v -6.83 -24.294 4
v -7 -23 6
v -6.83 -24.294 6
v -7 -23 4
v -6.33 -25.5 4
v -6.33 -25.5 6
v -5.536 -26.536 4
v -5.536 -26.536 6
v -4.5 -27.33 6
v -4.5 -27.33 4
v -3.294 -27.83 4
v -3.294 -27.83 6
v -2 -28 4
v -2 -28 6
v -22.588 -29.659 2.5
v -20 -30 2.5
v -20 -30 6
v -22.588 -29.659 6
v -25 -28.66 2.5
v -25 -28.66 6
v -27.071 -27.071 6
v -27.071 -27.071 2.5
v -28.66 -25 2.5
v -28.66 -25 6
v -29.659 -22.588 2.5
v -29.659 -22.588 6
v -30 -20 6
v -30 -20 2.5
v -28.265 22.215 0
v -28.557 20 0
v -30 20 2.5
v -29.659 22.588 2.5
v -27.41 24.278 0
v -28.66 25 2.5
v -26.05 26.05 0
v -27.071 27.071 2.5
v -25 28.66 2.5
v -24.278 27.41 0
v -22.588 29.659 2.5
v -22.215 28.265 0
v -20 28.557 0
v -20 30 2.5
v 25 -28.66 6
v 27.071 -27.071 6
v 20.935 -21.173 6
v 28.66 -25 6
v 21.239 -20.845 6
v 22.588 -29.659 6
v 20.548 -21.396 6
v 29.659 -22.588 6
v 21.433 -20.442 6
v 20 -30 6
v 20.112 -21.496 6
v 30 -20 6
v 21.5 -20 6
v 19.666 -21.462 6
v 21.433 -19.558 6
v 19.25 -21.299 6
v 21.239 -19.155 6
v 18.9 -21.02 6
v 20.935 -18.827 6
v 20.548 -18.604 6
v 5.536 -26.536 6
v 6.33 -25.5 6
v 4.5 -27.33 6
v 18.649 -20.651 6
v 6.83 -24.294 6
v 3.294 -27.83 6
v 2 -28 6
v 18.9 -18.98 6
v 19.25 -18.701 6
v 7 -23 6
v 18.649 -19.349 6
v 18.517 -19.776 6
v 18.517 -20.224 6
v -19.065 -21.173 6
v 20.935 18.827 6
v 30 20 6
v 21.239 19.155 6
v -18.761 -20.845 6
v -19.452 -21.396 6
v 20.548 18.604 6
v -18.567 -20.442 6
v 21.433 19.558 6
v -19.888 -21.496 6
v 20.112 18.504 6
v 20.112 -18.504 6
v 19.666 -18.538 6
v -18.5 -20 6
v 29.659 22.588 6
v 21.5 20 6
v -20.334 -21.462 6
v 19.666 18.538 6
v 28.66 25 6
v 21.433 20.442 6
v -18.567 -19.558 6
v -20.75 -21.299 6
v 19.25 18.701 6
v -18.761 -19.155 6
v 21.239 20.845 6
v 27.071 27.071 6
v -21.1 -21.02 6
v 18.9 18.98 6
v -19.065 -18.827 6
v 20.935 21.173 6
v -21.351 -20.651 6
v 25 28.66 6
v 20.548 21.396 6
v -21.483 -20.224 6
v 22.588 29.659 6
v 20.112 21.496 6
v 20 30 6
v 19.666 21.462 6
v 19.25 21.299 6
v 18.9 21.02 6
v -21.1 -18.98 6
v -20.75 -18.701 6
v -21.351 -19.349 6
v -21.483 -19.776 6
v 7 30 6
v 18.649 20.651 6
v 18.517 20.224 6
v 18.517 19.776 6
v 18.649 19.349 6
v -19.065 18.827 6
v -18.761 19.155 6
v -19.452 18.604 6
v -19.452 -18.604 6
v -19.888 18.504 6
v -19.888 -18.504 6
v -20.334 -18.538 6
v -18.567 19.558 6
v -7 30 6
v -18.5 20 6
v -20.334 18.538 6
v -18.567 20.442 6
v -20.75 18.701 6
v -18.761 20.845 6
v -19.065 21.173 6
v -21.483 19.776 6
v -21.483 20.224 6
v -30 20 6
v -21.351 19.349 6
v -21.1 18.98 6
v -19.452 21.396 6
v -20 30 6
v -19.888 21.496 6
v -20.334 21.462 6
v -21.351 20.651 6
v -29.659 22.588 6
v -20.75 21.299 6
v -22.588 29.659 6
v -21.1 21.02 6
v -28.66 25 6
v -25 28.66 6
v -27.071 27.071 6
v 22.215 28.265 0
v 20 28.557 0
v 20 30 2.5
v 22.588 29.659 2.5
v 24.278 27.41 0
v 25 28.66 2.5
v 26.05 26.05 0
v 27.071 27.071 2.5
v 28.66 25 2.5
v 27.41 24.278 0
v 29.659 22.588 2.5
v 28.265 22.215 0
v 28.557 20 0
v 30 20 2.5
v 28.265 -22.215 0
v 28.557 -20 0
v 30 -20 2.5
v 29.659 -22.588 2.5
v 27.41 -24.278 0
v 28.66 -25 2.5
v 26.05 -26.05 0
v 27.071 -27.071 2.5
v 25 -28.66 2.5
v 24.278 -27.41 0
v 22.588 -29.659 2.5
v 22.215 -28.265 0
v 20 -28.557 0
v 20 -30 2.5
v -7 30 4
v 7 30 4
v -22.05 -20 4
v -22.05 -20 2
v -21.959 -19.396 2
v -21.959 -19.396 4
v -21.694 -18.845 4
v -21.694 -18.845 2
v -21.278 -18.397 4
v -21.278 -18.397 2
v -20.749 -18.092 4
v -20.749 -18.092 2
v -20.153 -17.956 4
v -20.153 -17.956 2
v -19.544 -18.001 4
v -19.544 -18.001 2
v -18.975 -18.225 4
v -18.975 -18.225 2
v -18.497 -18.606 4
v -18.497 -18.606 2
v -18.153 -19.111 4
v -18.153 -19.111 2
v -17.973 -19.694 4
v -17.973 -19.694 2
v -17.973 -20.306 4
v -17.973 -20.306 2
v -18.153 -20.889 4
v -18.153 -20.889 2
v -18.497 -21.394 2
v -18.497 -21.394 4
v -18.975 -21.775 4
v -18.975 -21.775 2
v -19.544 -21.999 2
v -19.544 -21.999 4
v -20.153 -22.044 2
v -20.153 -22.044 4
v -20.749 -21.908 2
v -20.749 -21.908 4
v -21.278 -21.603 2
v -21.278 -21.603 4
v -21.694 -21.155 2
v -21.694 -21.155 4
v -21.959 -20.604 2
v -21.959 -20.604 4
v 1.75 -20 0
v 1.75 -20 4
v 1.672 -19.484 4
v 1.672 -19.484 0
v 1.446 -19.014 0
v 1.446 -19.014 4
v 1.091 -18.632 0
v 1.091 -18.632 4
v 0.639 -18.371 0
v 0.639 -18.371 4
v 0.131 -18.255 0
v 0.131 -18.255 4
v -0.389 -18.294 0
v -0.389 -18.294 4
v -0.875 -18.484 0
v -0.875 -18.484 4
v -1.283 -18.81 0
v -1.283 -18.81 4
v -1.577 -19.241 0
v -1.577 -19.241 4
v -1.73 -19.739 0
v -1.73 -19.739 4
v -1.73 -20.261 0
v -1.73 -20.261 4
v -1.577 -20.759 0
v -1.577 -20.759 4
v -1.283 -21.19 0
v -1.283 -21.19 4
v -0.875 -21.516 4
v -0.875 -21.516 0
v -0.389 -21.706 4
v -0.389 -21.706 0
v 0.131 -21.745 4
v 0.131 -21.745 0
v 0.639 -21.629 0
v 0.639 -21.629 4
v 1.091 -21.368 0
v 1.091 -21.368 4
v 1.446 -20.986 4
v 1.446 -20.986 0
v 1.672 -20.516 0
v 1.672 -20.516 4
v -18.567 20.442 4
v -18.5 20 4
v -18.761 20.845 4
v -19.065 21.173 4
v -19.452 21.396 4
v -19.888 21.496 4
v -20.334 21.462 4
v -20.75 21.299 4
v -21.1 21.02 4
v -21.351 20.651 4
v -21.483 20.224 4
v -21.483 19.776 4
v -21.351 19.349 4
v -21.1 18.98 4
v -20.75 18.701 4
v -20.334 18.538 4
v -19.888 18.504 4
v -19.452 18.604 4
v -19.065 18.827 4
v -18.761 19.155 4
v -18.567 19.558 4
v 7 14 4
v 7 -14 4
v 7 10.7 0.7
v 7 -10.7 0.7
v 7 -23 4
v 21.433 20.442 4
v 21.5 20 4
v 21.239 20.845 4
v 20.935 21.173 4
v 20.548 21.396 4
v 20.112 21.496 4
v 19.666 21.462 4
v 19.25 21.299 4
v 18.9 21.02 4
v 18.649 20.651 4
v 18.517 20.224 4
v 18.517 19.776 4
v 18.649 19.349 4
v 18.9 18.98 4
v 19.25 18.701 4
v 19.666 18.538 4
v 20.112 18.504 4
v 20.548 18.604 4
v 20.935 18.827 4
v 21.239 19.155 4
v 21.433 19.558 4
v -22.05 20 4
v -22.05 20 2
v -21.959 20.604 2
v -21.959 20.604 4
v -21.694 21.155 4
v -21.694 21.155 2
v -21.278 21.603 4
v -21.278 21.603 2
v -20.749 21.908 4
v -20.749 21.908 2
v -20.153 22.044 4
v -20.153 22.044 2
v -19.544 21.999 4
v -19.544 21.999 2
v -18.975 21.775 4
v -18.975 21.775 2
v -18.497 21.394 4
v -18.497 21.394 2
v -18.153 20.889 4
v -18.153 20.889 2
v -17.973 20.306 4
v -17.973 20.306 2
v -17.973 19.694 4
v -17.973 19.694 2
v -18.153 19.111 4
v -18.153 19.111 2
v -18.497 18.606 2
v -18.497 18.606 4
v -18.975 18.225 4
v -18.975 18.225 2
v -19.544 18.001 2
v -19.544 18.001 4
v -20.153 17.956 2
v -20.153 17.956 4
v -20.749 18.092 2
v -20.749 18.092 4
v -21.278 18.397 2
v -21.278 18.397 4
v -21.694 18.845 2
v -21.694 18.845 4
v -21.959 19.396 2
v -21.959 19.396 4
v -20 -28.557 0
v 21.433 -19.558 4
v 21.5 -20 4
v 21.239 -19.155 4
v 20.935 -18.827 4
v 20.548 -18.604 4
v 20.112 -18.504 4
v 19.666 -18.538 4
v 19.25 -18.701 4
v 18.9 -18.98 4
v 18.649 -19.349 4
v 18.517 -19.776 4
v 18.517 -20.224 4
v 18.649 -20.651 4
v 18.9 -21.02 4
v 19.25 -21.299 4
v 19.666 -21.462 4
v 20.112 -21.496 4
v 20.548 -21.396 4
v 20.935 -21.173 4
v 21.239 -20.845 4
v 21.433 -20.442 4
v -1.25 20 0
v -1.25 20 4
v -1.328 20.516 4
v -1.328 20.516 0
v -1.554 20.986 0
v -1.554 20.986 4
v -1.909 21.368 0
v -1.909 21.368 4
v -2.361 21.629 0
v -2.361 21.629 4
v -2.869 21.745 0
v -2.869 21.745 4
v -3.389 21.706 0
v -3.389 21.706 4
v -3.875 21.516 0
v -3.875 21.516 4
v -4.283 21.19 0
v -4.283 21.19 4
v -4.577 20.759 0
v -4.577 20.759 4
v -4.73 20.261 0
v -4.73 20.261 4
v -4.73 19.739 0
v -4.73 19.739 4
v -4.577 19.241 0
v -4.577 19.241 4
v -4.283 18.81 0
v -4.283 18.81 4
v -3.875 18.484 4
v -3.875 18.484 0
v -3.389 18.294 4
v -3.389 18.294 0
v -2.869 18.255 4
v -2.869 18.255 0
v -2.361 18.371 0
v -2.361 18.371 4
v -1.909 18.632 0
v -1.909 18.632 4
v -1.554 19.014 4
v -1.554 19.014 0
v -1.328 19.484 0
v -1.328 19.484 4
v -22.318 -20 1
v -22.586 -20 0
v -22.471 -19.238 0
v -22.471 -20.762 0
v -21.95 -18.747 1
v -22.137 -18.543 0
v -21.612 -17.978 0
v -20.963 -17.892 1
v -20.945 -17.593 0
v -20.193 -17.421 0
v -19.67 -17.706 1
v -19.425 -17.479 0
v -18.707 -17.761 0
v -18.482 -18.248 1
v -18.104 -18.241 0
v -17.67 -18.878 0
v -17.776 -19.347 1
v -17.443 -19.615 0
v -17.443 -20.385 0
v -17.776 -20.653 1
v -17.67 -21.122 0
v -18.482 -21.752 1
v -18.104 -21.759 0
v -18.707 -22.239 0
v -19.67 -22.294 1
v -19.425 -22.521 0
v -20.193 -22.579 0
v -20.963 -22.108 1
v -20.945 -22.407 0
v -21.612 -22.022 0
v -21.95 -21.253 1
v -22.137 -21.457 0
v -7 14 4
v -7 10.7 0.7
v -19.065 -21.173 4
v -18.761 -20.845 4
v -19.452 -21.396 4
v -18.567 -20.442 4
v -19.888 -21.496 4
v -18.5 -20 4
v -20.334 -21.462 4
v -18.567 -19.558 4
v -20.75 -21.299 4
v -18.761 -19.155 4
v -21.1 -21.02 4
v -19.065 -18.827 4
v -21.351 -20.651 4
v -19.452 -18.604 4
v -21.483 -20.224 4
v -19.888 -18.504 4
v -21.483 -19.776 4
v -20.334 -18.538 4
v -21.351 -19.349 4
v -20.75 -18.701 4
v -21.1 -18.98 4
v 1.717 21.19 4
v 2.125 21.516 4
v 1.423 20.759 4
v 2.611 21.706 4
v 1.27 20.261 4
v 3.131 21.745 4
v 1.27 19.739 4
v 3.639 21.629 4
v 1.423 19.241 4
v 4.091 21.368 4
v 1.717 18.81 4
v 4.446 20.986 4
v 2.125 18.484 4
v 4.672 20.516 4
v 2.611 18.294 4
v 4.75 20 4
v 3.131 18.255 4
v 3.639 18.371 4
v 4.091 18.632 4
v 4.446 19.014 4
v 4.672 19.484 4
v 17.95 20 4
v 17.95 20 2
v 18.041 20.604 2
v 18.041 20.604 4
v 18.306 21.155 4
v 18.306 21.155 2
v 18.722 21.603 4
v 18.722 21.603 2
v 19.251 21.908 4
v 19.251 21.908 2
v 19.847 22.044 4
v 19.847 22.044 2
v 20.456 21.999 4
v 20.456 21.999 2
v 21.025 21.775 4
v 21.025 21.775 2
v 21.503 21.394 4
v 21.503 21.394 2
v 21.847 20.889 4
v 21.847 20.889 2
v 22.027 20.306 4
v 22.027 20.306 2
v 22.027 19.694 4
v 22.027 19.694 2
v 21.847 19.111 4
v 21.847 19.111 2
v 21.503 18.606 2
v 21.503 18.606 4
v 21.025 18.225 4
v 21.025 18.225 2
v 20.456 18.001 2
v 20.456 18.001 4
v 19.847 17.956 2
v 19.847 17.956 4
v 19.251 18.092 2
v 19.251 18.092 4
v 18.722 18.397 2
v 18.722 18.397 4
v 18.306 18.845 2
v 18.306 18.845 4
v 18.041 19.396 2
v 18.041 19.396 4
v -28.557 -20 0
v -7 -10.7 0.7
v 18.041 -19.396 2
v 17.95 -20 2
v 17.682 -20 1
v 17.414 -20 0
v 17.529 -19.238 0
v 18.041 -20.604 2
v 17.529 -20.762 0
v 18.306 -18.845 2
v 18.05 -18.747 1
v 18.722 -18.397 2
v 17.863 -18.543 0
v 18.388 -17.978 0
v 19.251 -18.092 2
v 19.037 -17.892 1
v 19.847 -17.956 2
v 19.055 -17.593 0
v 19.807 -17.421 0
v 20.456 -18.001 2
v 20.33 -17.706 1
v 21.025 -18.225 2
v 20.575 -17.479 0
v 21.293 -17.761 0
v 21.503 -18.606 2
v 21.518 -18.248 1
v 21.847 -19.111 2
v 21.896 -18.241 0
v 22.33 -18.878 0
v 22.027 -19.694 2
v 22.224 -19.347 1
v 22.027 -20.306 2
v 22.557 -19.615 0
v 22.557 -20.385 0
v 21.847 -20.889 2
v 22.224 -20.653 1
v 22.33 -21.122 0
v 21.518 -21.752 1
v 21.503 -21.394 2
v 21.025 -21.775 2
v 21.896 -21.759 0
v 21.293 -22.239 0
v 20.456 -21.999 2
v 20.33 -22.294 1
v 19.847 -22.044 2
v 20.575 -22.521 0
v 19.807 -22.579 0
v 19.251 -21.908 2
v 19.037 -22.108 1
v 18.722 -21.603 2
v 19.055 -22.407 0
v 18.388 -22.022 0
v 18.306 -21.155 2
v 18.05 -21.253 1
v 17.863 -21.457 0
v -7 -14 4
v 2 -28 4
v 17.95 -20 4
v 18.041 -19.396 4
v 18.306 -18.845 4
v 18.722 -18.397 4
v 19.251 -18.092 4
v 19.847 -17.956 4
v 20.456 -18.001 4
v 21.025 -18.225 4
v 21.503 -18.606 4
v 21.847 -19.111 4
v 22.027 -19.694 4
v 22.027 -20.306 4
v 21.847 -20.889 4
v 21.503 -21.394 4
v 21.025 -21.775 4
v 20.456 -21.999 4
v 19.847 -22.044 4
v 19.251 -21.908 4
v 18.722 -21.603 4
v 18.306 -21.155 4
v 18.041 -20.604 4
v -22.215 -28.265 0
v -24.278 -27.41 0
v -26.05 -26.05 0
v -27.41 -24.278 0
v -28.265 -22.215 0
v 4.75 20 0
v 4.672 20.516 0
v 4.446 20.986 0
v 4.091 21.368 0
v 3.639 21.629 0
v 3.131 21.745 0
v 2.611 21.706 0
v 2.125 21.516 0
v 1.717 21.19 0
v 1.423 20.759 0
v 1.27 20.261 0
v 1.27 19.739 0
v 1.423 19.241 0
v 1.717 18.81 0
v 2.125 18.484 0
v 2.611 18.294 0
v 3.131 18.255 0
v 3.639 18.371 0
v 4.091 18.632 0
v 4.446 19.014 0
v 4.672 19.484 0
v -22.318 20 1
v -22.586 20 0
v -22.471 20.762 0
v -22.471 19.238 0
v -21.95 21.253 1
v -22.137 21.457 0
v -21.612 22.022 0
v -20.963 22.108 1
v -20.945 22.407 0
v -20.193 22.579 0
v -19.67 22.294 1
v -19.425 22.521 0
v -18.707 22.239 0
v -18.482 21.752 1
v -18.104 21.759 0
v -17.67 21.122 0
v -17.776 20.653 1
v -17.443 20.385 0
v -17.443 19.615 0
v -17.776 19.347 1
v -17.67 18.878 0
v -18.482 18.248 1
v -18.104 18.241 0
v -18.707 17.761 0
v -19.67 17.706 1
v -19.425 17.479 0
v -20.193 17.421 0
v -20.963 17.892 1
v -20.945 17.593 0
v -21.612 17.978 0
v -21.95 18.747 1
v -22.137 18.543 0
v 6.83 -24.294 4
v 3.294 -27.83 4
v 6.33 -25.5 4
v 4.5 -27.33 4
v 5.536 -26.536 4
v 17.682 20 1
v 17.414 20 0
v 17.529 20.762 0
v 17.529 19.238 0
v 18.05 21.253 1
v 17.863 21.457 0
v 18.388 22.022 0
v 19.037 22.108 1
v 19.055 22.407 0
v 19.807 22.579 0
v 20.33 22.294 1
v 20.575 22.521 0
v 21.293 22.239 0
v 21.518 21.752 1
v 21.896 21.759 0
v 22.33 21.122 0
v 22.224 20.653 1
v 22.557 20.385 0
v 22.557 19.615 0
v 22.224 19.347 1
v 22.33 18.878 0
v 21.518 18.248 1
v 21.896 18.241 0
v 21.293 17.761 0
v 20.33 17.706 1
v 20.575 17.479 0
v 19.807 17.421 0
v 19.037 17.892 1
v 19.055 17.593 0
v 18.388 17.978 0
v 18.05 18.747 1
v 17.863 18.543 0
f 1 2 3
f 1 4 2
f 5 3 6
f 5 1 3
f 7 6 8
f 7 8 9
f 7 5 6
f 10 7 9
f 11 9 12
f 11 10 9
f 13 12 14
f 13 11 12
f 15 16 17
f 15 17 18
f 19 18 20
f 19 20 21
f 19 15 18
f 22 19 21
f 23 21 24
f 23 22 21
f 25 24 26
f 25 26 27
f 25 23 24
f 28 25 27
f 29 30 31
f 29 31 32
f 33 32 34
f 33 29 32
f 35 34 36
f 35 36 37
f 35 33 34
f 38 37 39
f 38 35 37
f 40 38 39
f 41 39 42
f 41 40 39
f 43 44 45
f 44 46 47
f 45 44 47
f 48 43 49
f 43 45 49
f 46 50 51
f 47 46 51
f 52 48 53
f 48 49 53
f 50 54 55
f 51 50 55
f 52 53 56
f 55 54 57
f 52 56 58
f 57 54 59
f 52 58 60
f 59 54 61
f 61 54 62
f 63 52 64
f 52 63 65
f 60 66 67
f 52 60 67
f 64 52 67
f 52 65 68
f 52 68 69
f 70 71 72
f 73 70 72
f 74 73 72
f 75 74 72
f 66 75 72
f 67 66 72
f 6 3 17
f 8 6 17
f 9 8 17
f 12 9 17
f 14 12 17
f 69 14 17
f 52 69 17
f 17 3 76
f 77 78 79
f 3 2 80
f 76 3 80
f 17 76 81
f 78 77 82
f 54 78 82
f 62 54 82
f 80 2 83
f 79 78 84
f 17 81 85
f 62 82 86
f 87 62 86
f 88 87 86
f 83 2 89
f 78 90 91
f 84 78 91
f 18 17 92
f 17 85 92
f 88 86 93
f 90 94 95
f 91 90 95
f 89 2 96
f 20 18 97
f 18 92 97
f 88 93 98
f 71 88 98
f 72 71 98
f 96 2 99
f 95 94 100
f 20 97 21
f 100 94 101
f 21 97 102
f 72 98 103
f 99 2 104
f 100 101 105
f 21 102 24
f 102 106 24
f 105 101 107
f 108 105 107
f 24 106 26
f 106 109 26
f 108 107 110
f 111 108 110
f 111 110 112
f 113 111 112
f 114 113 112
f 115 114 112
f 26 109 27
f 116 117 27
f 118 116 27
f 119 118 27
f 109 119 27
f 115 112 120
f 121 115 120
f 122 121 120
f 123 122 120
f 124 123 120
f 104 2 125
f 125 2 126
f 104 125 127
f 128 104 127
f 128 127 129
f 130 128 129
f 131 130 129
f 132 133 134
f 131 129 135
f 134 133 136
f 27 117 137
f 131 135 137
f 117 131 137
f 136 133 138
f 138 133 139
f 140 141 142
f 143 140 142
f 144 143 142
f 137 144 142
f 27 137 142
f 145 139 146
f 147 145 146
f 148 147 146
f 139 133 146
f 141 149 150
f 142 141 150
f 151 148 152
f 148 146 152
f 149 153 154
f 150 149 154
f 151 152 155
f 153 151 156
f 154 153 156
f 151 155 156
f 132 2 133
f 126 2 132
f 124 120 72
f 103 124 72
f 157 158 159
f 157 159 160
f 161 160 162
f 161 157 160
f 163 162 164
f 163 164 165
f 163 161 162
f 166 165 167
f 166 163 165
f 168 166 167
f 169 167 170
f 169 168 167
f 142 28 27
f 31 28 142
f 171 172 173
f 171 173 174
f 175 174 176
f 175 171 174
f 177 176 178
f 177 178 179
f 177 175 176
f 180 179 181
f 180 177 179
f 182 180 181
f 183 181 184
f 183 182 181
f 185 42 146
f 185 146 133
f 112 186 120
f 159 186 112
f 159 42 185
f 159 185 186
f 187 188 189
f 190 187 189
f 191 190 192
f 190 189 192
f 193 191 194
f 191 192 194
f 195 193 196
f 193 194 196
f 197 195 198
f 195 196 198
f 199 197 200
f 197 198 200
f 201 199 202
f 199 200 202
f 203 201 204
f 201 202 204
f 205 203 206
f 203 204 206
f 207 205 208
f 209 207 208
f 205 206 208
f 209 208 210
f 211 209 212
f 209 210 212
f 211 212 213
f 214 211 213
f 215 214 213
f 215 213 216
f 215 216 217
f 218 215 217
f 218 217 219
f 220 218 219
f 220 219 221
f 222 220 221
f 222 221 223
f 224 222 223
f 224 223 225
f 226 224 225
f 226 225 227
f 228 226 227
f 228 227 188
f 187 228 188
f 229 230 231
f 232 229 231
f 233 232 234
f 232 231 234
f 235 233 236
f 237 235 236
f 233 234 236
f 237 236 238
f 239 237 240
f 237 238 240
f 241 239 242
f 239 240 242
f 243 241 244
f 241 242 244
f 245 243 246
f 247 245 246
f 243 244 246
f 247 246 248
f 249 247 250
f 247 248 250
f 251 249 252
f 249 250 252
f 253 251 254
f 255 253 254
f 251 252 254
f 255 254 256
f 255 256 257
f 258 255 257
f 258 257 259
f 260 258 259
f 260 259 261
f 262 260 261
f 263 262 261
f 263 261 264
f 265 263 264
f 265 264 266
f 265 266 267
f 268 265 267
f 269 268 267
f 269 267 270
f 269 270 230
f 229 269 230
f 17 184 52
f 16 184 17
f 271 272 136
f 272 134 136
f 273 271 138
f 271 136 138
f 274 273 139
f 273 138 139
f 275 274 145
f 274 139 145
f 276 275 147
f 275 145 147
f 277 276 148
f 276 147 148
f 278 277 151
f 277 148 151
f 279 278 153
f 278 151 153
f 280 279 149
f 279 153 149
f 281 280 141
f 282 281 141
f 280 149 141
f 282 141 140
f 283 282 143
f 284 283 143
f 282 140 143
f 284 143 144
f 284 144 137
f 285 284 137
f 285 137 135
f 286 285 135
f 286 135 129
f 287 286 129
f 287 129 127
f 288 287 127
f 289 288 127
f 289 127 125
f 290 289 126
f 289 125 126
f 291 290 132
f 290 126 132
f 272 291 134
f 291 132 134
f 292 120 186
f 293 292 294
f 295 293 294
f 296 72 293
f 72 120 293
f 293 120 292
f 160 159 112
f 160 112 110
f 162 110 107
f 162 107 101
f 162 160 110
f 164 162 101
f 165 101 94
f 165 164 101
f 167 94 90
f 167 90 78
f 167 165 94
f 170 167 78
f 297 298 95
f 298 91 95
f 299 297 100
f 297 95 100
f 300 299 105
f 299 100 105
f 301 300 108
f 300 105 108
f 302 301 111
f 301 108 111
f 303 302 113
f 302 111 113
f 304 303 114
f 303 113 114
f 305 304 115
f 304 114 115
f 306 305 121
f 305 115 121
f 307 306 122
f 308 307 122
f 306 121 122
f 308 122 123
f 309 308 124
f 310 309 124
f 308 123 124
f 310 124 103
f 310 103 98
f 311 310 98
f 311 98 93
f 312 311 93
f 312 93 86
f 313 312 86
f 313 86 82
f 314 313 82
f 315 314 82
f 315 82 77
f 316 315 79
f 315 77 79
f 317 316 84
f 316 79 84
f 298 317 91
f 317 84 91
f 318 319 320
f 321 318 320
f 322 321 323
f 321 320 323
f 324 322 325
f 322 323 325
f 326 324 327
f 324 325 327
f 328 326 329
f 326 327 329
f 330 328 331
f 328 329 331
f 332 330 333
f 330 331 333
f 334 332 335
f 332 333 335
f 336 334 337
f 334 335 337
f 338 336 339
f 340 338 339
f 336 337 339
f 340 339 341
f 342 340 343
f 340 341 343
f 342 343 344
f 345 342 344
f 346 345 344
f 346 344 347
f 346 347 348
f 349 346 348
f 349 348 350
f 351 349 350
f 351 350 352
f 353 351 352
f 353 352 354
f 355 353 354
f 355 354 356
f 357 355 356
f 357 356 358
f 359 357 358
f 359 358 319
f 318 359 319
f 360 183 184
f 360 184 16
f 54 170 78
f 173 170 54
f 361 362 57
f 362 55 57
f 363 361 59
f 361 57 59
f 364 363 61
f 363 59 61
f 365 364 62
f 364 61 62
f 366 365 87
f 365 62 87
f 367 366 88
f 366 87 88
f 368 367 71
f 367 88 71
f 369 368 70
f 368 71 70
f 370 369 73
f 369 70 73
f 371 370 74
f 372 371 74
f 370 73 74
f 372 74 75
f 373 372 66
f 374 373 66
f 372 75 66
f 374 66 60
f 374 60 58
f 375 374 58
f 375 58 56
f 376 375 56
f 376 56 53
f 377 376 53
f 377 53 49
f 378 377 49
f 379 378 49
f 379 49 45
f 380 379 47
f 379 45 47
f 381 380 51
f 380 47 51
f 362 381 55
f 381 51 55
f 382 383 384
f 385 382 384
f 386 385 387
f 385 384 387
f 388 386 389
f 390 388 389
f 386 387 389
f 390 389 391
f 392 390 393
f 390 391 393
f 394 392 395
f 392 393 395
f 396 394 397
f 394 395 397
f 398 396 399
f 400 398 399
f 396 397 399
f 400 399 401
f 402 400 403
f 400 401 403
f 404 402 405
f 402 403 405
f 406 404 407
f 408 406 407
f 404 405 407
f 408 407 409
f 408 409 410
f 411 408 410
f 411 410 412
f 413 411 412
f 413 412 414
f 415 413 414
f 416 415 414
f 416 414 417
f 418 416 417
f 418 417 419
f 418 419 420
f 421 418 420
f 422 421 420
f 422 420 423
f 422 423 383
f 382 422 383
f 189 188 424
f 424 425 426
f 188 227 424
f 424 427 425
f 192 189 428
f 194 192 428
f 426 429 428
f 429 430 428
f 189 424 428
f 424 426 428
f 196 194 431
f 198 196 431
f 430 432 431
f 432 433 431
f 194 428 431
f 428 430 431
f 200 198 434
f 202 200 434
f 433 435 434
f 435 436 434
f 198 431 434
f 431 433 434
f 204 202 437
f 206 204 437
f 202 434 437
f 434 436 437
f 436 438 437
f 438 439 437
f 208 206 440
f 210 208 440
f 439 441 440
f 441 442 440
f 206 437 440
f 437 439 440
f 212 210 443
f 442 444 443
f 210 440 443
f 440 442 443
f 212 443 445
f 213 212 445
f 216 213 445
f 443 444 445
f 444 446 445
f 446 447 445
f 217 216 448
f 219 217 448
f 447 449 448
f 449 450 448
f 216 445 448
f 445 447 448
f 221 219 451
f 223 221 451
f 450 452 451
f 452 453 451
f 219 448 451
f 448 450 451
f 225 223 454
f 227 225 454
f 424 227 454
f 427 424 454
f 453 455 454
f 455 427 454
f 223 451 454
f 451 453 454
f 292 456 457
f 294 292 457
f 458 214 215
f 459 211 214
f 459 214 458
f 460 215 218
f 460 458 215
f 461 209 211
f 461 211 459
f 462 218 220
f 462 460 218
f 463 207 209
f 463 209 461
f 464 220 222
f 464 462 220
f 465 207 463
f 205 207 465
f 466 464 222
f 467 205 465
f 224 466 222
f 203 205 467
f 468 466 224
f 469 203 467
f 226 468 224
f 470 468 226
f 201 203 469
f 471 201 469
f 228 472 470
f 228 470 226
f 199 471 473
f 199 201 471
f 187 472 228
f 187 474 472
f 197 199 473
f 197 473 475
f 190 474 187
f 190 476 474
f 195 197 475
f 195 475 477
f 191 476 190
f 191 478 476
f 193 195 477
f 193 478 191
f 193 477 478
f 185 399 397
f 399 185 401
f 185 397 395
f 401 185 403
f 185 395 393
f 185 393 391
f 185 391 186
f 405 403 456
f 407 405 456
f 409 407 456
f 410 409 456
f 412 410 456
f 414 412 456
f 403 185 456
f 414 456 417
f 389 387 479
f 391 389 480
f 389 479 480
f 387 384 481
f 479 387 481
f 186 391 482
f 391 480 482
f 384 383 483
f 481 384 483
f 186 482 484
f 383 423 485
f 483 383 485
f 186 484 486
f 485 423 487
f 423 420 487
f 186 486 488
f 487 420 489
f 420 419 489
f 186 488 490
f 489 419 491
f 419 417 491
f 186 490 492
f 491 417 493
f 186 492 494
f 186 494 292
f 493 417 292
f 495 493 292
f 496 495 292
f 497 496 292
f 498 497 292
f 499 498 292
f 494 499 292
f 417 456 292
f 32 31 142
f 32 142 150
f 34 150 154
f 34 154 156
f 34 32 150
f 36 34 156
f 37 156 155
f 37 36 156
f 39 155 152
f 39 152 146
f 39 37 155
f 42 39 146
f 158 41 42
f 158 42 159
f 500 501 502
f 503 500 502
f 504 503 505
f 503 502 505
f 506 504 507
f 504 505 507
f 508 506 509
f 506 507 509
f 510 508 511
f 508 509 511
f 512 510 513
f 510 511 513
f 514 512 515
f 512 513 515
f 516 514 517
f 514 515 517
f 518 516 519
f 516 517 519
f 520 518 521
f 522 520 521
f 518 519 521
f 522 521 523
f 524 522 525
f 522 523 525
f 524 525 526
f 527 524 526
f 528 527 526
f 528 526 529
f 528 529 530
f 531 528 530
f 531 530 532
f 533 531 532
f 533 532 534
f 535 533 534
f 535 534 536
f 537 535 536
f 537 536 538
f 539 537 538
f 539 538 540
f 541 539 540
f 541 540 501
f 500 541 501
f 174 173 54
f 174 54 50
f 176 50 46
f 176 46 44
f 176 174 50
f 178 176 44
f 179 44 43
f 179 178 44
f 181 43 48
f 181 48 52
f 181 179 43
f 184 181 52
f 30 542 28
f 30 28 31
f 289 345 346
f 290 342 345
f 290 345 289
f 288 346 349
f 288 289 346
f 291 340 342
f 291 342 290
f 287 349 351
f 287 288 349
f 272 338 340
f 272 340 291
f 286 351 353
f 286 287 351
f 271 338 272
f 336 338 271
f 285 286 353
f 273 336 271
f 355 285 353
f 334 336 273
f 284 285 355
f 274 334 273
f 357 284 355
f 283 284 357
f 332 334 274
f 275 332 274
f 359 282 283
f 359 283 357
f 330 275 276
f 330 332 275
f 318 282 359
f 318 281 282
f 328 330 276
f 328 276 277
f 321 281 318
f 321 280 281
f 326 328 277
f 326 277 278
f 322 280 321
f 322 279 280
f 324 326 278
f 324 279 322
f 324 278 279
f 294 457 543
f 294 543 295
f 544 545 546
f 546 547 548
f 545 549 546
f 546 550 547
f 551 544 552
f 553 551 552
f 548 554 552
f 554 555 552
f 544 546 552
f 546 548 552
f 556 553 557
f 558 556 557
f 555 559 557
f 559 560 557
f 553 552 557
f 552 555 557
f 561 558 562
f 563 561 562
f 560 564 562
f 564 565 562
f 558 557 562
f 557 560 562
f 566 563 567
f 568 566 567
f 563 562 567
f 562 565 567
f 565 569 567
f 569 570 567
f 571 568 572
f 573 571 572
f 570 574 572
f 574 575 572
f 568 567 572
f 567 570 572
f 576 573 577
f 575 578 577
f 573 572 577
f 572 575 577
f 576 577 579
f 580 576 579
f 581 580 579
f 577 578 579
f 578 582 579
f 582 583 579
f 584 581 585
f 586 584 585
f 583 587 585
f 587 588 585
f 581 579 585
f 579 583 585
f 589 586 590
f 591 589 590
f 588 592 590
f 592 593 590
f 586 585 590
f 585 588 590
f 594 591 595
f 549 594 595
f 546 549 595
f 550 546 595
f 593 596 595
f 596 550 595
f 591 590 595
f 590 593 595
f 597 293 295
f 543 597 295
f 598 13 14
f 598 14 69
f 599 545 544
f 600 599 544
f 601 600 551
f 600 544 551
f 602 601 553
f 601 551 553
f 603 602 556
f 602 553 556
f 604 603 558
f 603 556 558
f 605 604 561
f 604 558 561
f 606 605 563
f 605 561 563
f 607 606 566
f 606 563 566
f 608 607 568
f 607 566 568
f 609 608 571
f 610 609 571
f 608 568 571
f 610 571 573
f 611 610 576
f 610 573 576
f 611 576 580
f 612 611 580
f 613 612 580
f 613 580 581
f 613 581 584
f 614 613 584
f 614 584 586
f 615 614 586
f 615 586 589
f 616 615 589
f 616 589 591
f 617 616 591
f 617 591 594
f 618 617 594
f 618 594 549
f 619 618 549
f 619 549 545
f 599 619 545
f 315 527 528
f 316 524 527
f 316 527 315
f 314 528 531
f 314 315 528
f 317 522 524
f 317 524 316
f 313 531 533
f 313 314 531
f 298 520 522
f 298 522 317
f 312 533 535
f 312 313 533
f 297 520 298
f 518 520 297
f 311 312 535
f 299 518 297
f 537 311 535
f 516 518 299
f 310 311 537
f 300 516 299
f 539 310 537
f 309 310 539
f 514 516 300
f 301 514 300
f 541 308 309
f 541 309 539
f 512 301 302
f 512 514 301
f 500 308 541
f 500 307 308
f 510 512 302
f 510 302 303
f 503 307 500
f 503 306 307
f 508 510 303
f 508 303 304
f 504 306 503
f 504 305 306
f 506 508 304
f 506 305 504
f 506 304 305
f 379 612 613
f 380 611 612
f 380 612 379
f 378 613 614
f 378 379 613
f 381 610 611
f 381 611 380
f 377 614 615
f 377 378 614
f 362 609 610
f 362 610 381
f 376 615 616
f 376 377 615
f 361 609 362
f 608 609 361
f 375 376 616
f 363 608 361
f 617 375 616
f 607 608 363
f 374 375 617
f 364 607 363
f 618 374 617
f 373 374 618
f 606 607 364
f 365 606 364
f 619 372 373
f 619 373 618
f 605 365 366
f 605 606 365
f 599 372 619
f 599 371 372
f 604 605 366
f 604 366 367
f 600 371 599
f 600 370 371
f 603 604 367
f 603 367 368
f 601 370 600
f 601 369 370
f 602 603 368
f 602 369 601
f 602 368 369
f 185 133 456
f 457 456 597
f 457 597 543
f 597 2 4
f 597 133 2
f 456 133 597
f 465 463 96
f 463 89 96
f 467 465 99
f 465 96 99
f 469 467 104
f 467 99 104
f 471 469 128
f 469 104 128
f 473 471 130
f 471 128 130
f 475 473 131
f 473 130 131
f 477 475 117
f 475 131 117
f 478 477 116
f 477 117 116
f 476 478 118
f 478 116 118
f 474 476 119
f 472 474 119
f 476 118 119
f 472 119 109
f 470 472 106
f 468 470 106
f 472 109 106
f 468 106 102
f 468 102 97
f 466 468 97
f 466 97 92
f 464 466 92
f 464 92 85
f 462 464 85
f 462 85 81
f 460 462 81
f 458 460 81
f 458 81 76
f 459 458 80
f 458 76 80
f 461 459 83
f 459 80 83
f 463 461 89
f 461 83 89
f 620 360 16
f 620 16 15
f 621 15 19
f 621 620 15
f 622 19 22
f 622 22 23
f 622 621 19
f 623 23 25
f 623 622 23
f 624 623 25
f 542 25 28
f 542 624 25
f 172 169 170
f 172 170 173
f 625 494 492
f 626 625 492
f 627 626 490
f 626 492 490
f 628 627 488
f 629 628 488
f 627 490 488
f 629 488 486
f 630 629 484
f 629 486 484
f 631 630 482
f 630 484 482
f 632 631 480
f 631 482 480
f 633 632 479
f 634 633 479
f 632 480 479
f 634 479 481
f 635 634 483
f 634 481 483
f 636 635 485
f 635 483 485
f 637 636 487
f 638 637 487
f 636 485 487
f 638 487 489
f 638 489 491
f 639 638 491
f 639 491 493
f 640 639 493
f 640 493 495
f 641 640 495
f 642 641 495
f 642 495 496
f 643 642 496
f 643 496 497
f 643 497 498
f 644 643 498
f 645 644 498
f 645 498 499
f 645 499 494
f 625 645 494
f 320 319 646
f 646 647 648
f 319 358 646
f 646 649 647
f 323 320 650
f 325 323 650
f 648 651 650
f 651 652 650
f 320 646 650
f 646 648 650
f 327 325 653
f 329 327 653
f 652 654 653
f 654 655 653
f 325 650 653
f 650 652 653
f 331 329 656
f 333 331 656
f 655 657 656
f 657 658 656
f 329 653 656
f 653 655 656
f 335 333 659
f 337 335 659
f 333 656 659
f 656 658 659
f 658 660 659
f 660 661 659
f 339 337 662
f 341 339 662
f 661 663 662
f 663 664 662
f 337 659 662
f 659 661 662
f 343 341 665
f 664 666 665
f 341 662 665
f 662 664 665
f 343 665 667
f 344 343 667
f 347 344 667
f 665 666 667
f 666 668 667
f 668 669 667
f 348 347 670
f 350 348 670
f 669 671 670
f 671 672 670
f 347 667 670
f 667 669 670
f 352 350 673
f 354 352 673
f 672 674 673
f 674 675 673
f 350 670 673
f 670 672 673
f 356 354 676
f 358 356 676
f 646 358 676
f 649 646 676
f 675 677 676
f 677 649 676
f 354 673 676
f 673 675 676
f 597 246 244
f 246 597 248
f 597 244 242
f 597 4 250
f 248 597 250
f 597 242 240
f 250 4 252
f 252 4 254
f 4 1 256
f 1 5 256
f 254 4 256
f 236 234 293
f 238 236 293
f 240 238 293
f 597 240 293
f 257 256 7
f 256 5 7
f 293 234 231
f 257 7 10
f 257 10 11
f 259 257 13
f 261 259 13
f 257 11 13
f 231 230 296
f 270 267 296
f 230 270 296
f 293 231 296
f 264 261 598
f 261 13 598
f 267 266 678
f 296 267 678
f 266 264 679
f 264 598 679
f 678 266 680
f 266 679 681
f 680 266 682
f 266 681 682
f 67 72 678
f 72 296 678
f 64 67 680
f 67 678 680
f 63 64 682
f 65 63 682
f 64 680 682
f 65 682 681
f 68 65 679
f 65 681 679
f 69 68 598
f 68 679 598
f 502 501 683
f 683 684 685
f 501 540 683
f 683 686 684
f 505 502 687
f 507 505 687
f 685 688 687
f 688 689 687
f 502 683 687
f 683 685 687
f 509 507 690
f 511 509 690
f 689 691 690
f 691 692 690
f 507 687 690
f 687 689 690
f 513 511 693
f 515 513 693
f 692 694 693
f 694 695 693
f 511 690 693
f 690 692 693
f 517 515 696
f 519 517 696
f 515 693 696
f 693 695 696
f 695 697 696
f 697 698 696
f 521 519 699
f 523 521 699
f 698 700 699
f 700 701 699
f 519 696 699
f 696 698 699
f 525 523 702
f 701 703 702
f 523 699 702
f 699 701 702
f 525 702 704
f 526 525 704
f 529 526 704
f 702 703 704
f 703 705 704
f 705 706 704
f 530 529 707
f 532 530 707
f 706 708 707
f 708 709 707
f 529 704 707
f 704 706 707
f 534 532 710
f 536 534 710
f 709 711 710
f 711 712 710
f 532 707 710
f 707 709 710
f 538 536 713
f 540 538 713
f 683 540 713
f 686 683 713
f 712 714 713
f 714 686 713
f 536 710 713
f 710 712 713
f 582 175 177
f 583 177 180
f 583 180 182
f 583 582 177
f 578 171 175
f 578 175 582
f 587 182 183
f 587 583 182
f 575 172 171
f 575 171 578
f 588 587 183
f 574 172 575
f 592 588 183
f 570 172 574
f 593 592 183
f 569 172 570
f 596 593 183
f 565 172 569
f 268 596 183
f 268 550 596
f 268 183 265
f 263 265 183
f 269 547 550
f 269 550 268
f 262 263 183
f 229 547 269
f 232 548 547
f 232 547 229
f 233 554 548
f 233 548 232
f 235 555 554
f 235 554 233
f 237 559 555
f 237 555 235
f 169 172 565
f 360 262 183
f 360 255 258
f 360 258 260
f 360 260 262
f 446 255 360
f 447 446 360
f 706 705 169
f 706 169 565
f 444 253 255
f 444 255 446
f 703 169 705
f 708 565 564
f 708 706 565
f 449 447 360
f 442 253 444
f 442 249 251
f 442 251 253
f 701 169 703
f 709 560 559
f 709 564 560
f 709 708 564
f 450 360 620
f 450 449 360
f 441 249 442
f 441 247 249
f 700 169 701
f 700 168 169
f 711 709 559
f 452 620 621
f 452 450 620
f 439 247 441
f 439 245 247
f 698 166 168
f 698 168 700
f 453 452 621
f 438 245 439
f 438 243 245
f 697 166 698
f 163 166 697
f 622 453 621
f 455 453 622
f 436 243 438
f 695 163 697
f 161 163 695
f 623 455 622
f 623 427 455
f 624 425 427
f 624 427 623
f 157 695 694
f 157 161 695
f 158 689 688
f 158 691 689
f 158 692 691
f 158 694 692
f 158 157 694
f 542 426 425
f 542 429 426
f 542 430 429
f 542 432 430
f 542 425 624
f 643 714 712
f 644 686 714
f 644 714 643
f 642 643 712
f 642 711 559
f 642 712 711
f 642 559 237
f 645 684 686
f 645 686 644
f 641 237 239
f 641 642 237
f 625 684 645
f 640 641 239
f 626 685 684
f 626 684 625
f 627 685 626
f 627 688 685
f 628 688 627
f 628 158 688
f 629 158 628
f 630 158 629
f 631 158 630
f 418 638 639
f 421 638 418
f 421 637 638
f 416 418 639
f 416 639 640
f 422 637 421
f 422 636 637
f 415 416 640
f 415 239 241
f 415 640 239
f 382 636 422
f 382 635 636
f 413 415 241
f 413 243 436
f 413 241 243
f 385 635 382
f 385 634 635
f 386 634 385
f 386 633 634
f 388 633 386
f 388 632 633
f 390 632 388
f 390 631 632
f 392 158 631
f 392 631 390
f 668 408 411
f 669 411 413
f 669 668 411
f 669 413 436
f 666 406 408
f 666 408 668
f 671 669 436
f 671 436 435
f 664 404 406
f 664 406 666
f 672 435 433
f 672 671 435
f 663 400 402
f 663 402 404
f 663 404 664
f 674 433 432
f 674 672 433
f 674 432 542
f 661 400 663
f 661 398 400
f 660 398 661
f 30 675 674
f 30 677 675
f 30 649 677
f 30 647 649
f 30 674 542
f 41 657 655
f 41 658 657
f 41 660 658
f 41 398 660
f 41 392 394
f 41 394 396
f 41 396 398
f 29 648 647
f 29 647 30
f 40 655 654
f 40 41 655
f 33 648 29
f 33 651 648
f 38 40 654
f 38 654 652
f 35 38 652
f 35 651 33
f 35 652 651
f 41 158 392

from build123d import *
from OCP.BRepFilletAPI import BRepFilletAPI_MakeChamfer

# Parameters (mm, degrees)
BOSS_EXTRUDE1_DEPTH     = 6
CHAMFER1_SIZE           = 2.5
CHAMFER1_SIZE2          = 1.443375673
CUT_EXTRUDE1_DEPTH      = 43.848570571
CUT_EXTRUDE1_DEPTH_BACK = 28
SKETCH2_W               = 14
SKETCH2_H               = 6.892407629
SKETCH3_W               = 14
SKETCH3_H               = 20
CUT_EXTRUDE2_DEPTH      = 3.3
CHAMFER2_SIZE           = 4
HOLE1_D                 = 3
HOLE1_CBORE_D           = 4.1
HOLE1_CBORE_DEPTH       = 4
HOLE2_D                 = 3
HOLE2_CBORE_D           = 3.5
HOLE2_CBORE_DEPTH       = 20
FILLET2_R               = 5
CHAMFER3_SIZE           = 2
CHAMFER3_SIZE2          = 0.535898385


with BuildPart() as part:
    # Sketch1 → Boss-Extrude1 (new body)
    with BuildSketch(Plane.XY):
        with BuildLine():
            Line((-20, 30), (20, 30))
            ThreePointArc((20, 30), (27.071067812, 27.071067812), (30, 20))
            Line((30, 20), (30, -20))
            ThreePointArc((30, -20), (27.071067812, -27.071067812), (20, -30))
            Line((20, -30), (-20, -30))
            ThreePointArc((-20, -30), (-27.071067812, -27.071067812), (-30, -20))
            Line((-30, -20), (-30, 20))
            ThreePointArc((-30, 20), (-27.071067812, 27.071067812), (-20, 30))
        make_face()
    extrude(amount=BOSS_EXTRUDE1_DEPTH)

    # Chamfer1: one chamfer whose edges measure the first distance from different faces: ONE call of the kernel's chamfer builder (chamfer() names one face for all edges)
    chamfer1_edges_1 = [part.edges().sort_by_distance(p)[0] for p in [
        (0, 30, 0),
    ]]
    chamfer1_side_1 = [part.faces().sort_by_distance(p)[0] for p in [
        (0, 30, 3),
    ]]
    chamfer1_edges_2 = [part.edges().sort_by_distance(p)[0] for p in [
        (27.071067812, 27.071067812, 0),
    ]]
    chamfer1_side_2 = [part.faces().sort_by_distance(p)[0] for p in [
        (27.071067812, 27.071067812, 3),
    ]]
    chamfer1_edges_3 = [part.edges().sort_by_distance(p)[0] for p in [
        (30, 0, 0),
    ]]
    chamfer1_side_3 = [part.faces().sort_by_distance(p)[0] for p in [
        (30, 0, 3),
    ]]
    chamfer1_edges_4 = [part.edges().sort_by_distance(p)[0] for p in [
        (27.071067812, -27.071067812, 0),
    ]]
    chamfer1_side_4 = [part.faces().sort_by_distance(p)[0] for p in [
        (27.071067812, -27.071067812, 3),
    ]]
    chamfer1_edges_5 = [part.edges().sort_by_distance(p)[0] for p in [
        (0, -30, 0),
    ]]
    chamfer1_side_5 = [part.faces().sort_by_distance(p)[0] for p in [
        (0, -30, 3),
    ]]
    chamfer1_edges_6 = [part.edges().sort_by_distance(p)[0] for p in [
        (-27.071067812, -27.071067812, 0),
    ]]
    chamfer1_side_6 = [part.faces().sort_by_distance(p)[0] for p in [
        (-27.071067812, -27.071067812, 3),
    ]]
    chamfer1_edges_7 = [part.edges().sort_by_distance(p)[0] for p in [
        (-30, 0, 0),
    ]]
    chamfer1_side_7 = [part.faces().sort_by_distance(p)[0] for p in [
        (-30, 0, 3),
    ]]
    chamfer1_edges_8 = [part.edges().sort_by_distance(p)[0] for p in [
        (-27.071067812, 27.071067812, 0),
    ]]
    chamfer1_side_8 = [part.faces().sort_by_distance(p)[0] for p in [
        (-27.071067812, 27.071067812, 3),
    ]]
    chamfer1 = BRepFilletAPI_MakeChamfer(part.part.solid().wrapped)
    for e in chamfer1_edges_1:
        chamfer1.Add(CHAMFER1_SIZE, CHAMFER1_SIZE2, e.wrapped, chamfer1_side_1[0].wrapped)  # the first distance lies on this face
    for e in chamfer1_edges_2:
        chamfer1.Add(CHAMFER1_SIZE, CHAMFER1_SIZE2, e.wrapped, chamfer1_side_2[0].wrapped)  # the first distance lies on this face
    for e in chamfer1_edges_3:
        chamfer1.Add(CHAMFER1_SIZE, CHAMFER1_SIZE2, e.wrapped, chamfer1_side_3[0].wrapped)  # the first distance lies on this face
    for e in chamfer1_edges_4:
        chamfer1.Add(CHAMFER1_SIZE, CHAMFER1_SIZE2, e.wrapped, chamfer1_side_4[0].wrapped)  # the first distance lies on this face
    for e in chamfer1_edges_5:
        chamfer1.Add(CHAMFER1_SIZE, CHAMFER1_SIZE2, e.wrapped, chamfer1_side_5[0].wrapped)  # the first distance lies on this face
    for e in chamfer1_edges_6:
        chamfer1.Add(CHAMFER1_SIZE, CHAMFER1_SIZE2, e.wrapped, chamfer1_side_6[0].wrapped)  # the first distance lies on this face
    for e in chamfer1_edges_7:
        chamfer1.Add(CHAMFER1_SIZE, CHAMFER1_SIZE2, e.wrapped, chamfer1_side_7[0].wrapped)  # the first distance lies on this face
    for e in chamfer1_edges_8:
        chamfer1.Add(CHAMFER1_SIZE, CHAMFER1_SIZE2, e.wrapped, chamfer1_side_8[0].wrapped)  # the first distance lies on this face
    add(Compound.cast(chamfer1.Shape()), mode=Mode.REPLACE)

    # Sketch2 → Cut-Extrude1 (cut, two sides: drawn at the far end of the back side and taken through both)
    with BuildSketch(Plane(origin=(0, 0, 0), x_dir=(1, 0, 0), z_dir=(0, 1, 0)).offset(-CUT_EXTRUDE1_DEPTH_BACK)):
        with Locations((0, -7.446203815)):
            Rectangle(SKETCH2_W, SKETCH2_H)
    extrude(amount=CUT_EXTRUDE1_DEPTH + CUT_EXTRUDE1_DEPTH_BACK, mode=Mode.SUBTRACT)

    # Sketch3 → Cut-Extrude2 (cut)
    with BuildSketch(Plane.XY.offset(4)):
        Rectangle(SKETCH3_W, SKETCH3_H)
    extrude(amount=-CUT_EXTRUDE2_DEPTH, mode=Mode.SUBTRACT)

    # Chamfer2
    # the kernel refuses this chamfer: 4 mm, written as the material it takes off along each edge
    with BuildSketch(Plane(origin=(-7, 10, 4), x_dir=(0, 0.9996219169112968, 0.02749587661058627), z_dir=(1, 0, 0))) as chamfer2_piece_1_section:
        Polygon((CHAMFER2_SIZE * 0.999621916911, -CHAMFER2_SIZE * 0.0274958766106), (-CHAMFER2_SIZE * 0.0274958766106, -CHAMFER2_SIZE * 0.999621916911), (0, 0), align=None)
    chamfer2_piece_1 = extrude(amount=14, mode=Mode.PRIVATE)
    chamfer2_piece_1 = split(chamfer2_piece_1, bisect_by=Plane(origin=(0, 11.371649583, 0.7), z_dir=(0, 0, 1)), keep=Keep.TOP, mode=Mode.PRIVATE)
    add(chamfer2_piece_1, mode=Mode.SUBTRACT)
    with BuildSketch(Plane(origin=(7, -10, 4), x_dir=(0, -0.9996219169112968, 0.02749587661058627), z_dir=(-1, 0, 0))) as chamfer2_piece_2_section:
        Polygon((CHAMFER2_SIZE * 0.999621916911, -CHAMFER2_SIZE * 0.0274958766106), (-CHAMFER2_SIZE * 0.0274958766106, -CHAMFER2_SIZE * 0.999621916911), (0, 0), align=None)
    chamfer2_piece_2 = extrude(amount=14, mode=Mode.PRIVATE)
    chamfer2_piece_2 = split(chamfer2_piece_2, bisect_by=Plane(origin=(0, -11.371649583, 0.7), z_dir=(0, 0, 1)), keep=Keep.TOP, mode=Mode.PRIVATE)
    add(chamfer2_piece_2, mode=Mode.SUBTRACT)

    # Hole1 (through all)
    with Locations(Plane(origin=(0, 0, 0), x_dir=(-1, 0, 0), z_dir=(0, 0, -1))):
        with Locations((20, -20), (-20, -20), (-20, 20), (20, 20)):
            CounterBoreHole(HOLE1_D / 2, HOLE1_CBORE_D / 2, HOLE1_CBORE_DEPTH)

    # Hole2 (through all)
    with Locations(Plane.XY.offset(4)):
        with Locations((3, 20), (-3, 20), (0, -20)):
            CounterBoreHole(HOLE2_D / 2, HOLE2_CBORE_D / 2, HOLE2_CBORE_DEPTH)

    # Fillet2
    fillet2_edges = [part.edges().sort_by_distance(p)[0] for p in [
        (-7, -28, 5),
        (7, -28, 5),
    ]]
    fillet(fillet2_edges, radius=FILLET2_R)

    # Chamfer3: one chamfer whose edges measure the first distance from different faces: ONE call of the kernel's chamfer builder (chamfer() names one face for all edges)
    chamfer3_edges_1 = [part.edges().sort_by_distance(p)[0] for p in [
        (22.05, 20, 0),
    ]]
    chamfer3_side_1 = [part.faces().sort_by_distance(p)[0] for p in [
        (22.05, 20, 2),
    ]]
    chamfer3_edges_2 = [part.edges().sort_by_distance(p)[0] for p in [
        (22.05, -20, 0),
    ]]
    chamfer3_side_2 = [part.faces().sort_by_distance(p)[0] for p in [
        (22.05, -20, 2),
    ]]
    chamfer3_edges_3 = [part.edges().sort_by_distance(p)[0] for p in [
        (-17.95, -20, 0),
    ]]
    chamfer3_side_3 = [part.faces().sort_by_distance(p)[0] for p in [
        (-17.95, -20, 2),
    ]]
    chamfer3_edges_4 = [part.edges().sort_by_distance(p)[0] for p in [
        (-17.95, 20, 0),
    ]]
    chamfer3_side_4 = [part.faces().sort_by_distance(p)[0] for p in [
        (-17.95, 20, 2),
    ]]
    chamfer3 = BRepFilletAPI_MakeChamfer(part.part.solid().wrapped)
    for e in chamfer3_edges_1:
        chamfer3.Add(CHAMFER3_SIZE, CHAMFER3_SIZE2, e.wrapped, chamfer3_side_1[0].wrapped)  # the first distance lies on this face
    for e in chamfer3_edges_2:
        chamfer3.Add(CHAMFER3_SIZE, CHAMFER3_SIZE2, e.wrapped, chamfer3_side_2[0].wrapped)  # the first distance lies on this face
    for e in chamfer3_edges_3:
        chamfer3.Add(CHAMFER3_SIZE, CHAMFER3_SIZE2, e.wrapped, chamfer3_side_3[0].wrapped)  # the first distance lies on this face
    for e in chamfer3_edges_4:
        chamfer3.Add(CHAMFER3_SIZE, CHAMFER3_SIZE2, e.wrapped, chamfer3_side_4[0].wrapped)  # the first distance lies on this face
    add(Compound.cast(chamfer3.Shape()), mode=Mode.REPLACE)


solid = part.part
